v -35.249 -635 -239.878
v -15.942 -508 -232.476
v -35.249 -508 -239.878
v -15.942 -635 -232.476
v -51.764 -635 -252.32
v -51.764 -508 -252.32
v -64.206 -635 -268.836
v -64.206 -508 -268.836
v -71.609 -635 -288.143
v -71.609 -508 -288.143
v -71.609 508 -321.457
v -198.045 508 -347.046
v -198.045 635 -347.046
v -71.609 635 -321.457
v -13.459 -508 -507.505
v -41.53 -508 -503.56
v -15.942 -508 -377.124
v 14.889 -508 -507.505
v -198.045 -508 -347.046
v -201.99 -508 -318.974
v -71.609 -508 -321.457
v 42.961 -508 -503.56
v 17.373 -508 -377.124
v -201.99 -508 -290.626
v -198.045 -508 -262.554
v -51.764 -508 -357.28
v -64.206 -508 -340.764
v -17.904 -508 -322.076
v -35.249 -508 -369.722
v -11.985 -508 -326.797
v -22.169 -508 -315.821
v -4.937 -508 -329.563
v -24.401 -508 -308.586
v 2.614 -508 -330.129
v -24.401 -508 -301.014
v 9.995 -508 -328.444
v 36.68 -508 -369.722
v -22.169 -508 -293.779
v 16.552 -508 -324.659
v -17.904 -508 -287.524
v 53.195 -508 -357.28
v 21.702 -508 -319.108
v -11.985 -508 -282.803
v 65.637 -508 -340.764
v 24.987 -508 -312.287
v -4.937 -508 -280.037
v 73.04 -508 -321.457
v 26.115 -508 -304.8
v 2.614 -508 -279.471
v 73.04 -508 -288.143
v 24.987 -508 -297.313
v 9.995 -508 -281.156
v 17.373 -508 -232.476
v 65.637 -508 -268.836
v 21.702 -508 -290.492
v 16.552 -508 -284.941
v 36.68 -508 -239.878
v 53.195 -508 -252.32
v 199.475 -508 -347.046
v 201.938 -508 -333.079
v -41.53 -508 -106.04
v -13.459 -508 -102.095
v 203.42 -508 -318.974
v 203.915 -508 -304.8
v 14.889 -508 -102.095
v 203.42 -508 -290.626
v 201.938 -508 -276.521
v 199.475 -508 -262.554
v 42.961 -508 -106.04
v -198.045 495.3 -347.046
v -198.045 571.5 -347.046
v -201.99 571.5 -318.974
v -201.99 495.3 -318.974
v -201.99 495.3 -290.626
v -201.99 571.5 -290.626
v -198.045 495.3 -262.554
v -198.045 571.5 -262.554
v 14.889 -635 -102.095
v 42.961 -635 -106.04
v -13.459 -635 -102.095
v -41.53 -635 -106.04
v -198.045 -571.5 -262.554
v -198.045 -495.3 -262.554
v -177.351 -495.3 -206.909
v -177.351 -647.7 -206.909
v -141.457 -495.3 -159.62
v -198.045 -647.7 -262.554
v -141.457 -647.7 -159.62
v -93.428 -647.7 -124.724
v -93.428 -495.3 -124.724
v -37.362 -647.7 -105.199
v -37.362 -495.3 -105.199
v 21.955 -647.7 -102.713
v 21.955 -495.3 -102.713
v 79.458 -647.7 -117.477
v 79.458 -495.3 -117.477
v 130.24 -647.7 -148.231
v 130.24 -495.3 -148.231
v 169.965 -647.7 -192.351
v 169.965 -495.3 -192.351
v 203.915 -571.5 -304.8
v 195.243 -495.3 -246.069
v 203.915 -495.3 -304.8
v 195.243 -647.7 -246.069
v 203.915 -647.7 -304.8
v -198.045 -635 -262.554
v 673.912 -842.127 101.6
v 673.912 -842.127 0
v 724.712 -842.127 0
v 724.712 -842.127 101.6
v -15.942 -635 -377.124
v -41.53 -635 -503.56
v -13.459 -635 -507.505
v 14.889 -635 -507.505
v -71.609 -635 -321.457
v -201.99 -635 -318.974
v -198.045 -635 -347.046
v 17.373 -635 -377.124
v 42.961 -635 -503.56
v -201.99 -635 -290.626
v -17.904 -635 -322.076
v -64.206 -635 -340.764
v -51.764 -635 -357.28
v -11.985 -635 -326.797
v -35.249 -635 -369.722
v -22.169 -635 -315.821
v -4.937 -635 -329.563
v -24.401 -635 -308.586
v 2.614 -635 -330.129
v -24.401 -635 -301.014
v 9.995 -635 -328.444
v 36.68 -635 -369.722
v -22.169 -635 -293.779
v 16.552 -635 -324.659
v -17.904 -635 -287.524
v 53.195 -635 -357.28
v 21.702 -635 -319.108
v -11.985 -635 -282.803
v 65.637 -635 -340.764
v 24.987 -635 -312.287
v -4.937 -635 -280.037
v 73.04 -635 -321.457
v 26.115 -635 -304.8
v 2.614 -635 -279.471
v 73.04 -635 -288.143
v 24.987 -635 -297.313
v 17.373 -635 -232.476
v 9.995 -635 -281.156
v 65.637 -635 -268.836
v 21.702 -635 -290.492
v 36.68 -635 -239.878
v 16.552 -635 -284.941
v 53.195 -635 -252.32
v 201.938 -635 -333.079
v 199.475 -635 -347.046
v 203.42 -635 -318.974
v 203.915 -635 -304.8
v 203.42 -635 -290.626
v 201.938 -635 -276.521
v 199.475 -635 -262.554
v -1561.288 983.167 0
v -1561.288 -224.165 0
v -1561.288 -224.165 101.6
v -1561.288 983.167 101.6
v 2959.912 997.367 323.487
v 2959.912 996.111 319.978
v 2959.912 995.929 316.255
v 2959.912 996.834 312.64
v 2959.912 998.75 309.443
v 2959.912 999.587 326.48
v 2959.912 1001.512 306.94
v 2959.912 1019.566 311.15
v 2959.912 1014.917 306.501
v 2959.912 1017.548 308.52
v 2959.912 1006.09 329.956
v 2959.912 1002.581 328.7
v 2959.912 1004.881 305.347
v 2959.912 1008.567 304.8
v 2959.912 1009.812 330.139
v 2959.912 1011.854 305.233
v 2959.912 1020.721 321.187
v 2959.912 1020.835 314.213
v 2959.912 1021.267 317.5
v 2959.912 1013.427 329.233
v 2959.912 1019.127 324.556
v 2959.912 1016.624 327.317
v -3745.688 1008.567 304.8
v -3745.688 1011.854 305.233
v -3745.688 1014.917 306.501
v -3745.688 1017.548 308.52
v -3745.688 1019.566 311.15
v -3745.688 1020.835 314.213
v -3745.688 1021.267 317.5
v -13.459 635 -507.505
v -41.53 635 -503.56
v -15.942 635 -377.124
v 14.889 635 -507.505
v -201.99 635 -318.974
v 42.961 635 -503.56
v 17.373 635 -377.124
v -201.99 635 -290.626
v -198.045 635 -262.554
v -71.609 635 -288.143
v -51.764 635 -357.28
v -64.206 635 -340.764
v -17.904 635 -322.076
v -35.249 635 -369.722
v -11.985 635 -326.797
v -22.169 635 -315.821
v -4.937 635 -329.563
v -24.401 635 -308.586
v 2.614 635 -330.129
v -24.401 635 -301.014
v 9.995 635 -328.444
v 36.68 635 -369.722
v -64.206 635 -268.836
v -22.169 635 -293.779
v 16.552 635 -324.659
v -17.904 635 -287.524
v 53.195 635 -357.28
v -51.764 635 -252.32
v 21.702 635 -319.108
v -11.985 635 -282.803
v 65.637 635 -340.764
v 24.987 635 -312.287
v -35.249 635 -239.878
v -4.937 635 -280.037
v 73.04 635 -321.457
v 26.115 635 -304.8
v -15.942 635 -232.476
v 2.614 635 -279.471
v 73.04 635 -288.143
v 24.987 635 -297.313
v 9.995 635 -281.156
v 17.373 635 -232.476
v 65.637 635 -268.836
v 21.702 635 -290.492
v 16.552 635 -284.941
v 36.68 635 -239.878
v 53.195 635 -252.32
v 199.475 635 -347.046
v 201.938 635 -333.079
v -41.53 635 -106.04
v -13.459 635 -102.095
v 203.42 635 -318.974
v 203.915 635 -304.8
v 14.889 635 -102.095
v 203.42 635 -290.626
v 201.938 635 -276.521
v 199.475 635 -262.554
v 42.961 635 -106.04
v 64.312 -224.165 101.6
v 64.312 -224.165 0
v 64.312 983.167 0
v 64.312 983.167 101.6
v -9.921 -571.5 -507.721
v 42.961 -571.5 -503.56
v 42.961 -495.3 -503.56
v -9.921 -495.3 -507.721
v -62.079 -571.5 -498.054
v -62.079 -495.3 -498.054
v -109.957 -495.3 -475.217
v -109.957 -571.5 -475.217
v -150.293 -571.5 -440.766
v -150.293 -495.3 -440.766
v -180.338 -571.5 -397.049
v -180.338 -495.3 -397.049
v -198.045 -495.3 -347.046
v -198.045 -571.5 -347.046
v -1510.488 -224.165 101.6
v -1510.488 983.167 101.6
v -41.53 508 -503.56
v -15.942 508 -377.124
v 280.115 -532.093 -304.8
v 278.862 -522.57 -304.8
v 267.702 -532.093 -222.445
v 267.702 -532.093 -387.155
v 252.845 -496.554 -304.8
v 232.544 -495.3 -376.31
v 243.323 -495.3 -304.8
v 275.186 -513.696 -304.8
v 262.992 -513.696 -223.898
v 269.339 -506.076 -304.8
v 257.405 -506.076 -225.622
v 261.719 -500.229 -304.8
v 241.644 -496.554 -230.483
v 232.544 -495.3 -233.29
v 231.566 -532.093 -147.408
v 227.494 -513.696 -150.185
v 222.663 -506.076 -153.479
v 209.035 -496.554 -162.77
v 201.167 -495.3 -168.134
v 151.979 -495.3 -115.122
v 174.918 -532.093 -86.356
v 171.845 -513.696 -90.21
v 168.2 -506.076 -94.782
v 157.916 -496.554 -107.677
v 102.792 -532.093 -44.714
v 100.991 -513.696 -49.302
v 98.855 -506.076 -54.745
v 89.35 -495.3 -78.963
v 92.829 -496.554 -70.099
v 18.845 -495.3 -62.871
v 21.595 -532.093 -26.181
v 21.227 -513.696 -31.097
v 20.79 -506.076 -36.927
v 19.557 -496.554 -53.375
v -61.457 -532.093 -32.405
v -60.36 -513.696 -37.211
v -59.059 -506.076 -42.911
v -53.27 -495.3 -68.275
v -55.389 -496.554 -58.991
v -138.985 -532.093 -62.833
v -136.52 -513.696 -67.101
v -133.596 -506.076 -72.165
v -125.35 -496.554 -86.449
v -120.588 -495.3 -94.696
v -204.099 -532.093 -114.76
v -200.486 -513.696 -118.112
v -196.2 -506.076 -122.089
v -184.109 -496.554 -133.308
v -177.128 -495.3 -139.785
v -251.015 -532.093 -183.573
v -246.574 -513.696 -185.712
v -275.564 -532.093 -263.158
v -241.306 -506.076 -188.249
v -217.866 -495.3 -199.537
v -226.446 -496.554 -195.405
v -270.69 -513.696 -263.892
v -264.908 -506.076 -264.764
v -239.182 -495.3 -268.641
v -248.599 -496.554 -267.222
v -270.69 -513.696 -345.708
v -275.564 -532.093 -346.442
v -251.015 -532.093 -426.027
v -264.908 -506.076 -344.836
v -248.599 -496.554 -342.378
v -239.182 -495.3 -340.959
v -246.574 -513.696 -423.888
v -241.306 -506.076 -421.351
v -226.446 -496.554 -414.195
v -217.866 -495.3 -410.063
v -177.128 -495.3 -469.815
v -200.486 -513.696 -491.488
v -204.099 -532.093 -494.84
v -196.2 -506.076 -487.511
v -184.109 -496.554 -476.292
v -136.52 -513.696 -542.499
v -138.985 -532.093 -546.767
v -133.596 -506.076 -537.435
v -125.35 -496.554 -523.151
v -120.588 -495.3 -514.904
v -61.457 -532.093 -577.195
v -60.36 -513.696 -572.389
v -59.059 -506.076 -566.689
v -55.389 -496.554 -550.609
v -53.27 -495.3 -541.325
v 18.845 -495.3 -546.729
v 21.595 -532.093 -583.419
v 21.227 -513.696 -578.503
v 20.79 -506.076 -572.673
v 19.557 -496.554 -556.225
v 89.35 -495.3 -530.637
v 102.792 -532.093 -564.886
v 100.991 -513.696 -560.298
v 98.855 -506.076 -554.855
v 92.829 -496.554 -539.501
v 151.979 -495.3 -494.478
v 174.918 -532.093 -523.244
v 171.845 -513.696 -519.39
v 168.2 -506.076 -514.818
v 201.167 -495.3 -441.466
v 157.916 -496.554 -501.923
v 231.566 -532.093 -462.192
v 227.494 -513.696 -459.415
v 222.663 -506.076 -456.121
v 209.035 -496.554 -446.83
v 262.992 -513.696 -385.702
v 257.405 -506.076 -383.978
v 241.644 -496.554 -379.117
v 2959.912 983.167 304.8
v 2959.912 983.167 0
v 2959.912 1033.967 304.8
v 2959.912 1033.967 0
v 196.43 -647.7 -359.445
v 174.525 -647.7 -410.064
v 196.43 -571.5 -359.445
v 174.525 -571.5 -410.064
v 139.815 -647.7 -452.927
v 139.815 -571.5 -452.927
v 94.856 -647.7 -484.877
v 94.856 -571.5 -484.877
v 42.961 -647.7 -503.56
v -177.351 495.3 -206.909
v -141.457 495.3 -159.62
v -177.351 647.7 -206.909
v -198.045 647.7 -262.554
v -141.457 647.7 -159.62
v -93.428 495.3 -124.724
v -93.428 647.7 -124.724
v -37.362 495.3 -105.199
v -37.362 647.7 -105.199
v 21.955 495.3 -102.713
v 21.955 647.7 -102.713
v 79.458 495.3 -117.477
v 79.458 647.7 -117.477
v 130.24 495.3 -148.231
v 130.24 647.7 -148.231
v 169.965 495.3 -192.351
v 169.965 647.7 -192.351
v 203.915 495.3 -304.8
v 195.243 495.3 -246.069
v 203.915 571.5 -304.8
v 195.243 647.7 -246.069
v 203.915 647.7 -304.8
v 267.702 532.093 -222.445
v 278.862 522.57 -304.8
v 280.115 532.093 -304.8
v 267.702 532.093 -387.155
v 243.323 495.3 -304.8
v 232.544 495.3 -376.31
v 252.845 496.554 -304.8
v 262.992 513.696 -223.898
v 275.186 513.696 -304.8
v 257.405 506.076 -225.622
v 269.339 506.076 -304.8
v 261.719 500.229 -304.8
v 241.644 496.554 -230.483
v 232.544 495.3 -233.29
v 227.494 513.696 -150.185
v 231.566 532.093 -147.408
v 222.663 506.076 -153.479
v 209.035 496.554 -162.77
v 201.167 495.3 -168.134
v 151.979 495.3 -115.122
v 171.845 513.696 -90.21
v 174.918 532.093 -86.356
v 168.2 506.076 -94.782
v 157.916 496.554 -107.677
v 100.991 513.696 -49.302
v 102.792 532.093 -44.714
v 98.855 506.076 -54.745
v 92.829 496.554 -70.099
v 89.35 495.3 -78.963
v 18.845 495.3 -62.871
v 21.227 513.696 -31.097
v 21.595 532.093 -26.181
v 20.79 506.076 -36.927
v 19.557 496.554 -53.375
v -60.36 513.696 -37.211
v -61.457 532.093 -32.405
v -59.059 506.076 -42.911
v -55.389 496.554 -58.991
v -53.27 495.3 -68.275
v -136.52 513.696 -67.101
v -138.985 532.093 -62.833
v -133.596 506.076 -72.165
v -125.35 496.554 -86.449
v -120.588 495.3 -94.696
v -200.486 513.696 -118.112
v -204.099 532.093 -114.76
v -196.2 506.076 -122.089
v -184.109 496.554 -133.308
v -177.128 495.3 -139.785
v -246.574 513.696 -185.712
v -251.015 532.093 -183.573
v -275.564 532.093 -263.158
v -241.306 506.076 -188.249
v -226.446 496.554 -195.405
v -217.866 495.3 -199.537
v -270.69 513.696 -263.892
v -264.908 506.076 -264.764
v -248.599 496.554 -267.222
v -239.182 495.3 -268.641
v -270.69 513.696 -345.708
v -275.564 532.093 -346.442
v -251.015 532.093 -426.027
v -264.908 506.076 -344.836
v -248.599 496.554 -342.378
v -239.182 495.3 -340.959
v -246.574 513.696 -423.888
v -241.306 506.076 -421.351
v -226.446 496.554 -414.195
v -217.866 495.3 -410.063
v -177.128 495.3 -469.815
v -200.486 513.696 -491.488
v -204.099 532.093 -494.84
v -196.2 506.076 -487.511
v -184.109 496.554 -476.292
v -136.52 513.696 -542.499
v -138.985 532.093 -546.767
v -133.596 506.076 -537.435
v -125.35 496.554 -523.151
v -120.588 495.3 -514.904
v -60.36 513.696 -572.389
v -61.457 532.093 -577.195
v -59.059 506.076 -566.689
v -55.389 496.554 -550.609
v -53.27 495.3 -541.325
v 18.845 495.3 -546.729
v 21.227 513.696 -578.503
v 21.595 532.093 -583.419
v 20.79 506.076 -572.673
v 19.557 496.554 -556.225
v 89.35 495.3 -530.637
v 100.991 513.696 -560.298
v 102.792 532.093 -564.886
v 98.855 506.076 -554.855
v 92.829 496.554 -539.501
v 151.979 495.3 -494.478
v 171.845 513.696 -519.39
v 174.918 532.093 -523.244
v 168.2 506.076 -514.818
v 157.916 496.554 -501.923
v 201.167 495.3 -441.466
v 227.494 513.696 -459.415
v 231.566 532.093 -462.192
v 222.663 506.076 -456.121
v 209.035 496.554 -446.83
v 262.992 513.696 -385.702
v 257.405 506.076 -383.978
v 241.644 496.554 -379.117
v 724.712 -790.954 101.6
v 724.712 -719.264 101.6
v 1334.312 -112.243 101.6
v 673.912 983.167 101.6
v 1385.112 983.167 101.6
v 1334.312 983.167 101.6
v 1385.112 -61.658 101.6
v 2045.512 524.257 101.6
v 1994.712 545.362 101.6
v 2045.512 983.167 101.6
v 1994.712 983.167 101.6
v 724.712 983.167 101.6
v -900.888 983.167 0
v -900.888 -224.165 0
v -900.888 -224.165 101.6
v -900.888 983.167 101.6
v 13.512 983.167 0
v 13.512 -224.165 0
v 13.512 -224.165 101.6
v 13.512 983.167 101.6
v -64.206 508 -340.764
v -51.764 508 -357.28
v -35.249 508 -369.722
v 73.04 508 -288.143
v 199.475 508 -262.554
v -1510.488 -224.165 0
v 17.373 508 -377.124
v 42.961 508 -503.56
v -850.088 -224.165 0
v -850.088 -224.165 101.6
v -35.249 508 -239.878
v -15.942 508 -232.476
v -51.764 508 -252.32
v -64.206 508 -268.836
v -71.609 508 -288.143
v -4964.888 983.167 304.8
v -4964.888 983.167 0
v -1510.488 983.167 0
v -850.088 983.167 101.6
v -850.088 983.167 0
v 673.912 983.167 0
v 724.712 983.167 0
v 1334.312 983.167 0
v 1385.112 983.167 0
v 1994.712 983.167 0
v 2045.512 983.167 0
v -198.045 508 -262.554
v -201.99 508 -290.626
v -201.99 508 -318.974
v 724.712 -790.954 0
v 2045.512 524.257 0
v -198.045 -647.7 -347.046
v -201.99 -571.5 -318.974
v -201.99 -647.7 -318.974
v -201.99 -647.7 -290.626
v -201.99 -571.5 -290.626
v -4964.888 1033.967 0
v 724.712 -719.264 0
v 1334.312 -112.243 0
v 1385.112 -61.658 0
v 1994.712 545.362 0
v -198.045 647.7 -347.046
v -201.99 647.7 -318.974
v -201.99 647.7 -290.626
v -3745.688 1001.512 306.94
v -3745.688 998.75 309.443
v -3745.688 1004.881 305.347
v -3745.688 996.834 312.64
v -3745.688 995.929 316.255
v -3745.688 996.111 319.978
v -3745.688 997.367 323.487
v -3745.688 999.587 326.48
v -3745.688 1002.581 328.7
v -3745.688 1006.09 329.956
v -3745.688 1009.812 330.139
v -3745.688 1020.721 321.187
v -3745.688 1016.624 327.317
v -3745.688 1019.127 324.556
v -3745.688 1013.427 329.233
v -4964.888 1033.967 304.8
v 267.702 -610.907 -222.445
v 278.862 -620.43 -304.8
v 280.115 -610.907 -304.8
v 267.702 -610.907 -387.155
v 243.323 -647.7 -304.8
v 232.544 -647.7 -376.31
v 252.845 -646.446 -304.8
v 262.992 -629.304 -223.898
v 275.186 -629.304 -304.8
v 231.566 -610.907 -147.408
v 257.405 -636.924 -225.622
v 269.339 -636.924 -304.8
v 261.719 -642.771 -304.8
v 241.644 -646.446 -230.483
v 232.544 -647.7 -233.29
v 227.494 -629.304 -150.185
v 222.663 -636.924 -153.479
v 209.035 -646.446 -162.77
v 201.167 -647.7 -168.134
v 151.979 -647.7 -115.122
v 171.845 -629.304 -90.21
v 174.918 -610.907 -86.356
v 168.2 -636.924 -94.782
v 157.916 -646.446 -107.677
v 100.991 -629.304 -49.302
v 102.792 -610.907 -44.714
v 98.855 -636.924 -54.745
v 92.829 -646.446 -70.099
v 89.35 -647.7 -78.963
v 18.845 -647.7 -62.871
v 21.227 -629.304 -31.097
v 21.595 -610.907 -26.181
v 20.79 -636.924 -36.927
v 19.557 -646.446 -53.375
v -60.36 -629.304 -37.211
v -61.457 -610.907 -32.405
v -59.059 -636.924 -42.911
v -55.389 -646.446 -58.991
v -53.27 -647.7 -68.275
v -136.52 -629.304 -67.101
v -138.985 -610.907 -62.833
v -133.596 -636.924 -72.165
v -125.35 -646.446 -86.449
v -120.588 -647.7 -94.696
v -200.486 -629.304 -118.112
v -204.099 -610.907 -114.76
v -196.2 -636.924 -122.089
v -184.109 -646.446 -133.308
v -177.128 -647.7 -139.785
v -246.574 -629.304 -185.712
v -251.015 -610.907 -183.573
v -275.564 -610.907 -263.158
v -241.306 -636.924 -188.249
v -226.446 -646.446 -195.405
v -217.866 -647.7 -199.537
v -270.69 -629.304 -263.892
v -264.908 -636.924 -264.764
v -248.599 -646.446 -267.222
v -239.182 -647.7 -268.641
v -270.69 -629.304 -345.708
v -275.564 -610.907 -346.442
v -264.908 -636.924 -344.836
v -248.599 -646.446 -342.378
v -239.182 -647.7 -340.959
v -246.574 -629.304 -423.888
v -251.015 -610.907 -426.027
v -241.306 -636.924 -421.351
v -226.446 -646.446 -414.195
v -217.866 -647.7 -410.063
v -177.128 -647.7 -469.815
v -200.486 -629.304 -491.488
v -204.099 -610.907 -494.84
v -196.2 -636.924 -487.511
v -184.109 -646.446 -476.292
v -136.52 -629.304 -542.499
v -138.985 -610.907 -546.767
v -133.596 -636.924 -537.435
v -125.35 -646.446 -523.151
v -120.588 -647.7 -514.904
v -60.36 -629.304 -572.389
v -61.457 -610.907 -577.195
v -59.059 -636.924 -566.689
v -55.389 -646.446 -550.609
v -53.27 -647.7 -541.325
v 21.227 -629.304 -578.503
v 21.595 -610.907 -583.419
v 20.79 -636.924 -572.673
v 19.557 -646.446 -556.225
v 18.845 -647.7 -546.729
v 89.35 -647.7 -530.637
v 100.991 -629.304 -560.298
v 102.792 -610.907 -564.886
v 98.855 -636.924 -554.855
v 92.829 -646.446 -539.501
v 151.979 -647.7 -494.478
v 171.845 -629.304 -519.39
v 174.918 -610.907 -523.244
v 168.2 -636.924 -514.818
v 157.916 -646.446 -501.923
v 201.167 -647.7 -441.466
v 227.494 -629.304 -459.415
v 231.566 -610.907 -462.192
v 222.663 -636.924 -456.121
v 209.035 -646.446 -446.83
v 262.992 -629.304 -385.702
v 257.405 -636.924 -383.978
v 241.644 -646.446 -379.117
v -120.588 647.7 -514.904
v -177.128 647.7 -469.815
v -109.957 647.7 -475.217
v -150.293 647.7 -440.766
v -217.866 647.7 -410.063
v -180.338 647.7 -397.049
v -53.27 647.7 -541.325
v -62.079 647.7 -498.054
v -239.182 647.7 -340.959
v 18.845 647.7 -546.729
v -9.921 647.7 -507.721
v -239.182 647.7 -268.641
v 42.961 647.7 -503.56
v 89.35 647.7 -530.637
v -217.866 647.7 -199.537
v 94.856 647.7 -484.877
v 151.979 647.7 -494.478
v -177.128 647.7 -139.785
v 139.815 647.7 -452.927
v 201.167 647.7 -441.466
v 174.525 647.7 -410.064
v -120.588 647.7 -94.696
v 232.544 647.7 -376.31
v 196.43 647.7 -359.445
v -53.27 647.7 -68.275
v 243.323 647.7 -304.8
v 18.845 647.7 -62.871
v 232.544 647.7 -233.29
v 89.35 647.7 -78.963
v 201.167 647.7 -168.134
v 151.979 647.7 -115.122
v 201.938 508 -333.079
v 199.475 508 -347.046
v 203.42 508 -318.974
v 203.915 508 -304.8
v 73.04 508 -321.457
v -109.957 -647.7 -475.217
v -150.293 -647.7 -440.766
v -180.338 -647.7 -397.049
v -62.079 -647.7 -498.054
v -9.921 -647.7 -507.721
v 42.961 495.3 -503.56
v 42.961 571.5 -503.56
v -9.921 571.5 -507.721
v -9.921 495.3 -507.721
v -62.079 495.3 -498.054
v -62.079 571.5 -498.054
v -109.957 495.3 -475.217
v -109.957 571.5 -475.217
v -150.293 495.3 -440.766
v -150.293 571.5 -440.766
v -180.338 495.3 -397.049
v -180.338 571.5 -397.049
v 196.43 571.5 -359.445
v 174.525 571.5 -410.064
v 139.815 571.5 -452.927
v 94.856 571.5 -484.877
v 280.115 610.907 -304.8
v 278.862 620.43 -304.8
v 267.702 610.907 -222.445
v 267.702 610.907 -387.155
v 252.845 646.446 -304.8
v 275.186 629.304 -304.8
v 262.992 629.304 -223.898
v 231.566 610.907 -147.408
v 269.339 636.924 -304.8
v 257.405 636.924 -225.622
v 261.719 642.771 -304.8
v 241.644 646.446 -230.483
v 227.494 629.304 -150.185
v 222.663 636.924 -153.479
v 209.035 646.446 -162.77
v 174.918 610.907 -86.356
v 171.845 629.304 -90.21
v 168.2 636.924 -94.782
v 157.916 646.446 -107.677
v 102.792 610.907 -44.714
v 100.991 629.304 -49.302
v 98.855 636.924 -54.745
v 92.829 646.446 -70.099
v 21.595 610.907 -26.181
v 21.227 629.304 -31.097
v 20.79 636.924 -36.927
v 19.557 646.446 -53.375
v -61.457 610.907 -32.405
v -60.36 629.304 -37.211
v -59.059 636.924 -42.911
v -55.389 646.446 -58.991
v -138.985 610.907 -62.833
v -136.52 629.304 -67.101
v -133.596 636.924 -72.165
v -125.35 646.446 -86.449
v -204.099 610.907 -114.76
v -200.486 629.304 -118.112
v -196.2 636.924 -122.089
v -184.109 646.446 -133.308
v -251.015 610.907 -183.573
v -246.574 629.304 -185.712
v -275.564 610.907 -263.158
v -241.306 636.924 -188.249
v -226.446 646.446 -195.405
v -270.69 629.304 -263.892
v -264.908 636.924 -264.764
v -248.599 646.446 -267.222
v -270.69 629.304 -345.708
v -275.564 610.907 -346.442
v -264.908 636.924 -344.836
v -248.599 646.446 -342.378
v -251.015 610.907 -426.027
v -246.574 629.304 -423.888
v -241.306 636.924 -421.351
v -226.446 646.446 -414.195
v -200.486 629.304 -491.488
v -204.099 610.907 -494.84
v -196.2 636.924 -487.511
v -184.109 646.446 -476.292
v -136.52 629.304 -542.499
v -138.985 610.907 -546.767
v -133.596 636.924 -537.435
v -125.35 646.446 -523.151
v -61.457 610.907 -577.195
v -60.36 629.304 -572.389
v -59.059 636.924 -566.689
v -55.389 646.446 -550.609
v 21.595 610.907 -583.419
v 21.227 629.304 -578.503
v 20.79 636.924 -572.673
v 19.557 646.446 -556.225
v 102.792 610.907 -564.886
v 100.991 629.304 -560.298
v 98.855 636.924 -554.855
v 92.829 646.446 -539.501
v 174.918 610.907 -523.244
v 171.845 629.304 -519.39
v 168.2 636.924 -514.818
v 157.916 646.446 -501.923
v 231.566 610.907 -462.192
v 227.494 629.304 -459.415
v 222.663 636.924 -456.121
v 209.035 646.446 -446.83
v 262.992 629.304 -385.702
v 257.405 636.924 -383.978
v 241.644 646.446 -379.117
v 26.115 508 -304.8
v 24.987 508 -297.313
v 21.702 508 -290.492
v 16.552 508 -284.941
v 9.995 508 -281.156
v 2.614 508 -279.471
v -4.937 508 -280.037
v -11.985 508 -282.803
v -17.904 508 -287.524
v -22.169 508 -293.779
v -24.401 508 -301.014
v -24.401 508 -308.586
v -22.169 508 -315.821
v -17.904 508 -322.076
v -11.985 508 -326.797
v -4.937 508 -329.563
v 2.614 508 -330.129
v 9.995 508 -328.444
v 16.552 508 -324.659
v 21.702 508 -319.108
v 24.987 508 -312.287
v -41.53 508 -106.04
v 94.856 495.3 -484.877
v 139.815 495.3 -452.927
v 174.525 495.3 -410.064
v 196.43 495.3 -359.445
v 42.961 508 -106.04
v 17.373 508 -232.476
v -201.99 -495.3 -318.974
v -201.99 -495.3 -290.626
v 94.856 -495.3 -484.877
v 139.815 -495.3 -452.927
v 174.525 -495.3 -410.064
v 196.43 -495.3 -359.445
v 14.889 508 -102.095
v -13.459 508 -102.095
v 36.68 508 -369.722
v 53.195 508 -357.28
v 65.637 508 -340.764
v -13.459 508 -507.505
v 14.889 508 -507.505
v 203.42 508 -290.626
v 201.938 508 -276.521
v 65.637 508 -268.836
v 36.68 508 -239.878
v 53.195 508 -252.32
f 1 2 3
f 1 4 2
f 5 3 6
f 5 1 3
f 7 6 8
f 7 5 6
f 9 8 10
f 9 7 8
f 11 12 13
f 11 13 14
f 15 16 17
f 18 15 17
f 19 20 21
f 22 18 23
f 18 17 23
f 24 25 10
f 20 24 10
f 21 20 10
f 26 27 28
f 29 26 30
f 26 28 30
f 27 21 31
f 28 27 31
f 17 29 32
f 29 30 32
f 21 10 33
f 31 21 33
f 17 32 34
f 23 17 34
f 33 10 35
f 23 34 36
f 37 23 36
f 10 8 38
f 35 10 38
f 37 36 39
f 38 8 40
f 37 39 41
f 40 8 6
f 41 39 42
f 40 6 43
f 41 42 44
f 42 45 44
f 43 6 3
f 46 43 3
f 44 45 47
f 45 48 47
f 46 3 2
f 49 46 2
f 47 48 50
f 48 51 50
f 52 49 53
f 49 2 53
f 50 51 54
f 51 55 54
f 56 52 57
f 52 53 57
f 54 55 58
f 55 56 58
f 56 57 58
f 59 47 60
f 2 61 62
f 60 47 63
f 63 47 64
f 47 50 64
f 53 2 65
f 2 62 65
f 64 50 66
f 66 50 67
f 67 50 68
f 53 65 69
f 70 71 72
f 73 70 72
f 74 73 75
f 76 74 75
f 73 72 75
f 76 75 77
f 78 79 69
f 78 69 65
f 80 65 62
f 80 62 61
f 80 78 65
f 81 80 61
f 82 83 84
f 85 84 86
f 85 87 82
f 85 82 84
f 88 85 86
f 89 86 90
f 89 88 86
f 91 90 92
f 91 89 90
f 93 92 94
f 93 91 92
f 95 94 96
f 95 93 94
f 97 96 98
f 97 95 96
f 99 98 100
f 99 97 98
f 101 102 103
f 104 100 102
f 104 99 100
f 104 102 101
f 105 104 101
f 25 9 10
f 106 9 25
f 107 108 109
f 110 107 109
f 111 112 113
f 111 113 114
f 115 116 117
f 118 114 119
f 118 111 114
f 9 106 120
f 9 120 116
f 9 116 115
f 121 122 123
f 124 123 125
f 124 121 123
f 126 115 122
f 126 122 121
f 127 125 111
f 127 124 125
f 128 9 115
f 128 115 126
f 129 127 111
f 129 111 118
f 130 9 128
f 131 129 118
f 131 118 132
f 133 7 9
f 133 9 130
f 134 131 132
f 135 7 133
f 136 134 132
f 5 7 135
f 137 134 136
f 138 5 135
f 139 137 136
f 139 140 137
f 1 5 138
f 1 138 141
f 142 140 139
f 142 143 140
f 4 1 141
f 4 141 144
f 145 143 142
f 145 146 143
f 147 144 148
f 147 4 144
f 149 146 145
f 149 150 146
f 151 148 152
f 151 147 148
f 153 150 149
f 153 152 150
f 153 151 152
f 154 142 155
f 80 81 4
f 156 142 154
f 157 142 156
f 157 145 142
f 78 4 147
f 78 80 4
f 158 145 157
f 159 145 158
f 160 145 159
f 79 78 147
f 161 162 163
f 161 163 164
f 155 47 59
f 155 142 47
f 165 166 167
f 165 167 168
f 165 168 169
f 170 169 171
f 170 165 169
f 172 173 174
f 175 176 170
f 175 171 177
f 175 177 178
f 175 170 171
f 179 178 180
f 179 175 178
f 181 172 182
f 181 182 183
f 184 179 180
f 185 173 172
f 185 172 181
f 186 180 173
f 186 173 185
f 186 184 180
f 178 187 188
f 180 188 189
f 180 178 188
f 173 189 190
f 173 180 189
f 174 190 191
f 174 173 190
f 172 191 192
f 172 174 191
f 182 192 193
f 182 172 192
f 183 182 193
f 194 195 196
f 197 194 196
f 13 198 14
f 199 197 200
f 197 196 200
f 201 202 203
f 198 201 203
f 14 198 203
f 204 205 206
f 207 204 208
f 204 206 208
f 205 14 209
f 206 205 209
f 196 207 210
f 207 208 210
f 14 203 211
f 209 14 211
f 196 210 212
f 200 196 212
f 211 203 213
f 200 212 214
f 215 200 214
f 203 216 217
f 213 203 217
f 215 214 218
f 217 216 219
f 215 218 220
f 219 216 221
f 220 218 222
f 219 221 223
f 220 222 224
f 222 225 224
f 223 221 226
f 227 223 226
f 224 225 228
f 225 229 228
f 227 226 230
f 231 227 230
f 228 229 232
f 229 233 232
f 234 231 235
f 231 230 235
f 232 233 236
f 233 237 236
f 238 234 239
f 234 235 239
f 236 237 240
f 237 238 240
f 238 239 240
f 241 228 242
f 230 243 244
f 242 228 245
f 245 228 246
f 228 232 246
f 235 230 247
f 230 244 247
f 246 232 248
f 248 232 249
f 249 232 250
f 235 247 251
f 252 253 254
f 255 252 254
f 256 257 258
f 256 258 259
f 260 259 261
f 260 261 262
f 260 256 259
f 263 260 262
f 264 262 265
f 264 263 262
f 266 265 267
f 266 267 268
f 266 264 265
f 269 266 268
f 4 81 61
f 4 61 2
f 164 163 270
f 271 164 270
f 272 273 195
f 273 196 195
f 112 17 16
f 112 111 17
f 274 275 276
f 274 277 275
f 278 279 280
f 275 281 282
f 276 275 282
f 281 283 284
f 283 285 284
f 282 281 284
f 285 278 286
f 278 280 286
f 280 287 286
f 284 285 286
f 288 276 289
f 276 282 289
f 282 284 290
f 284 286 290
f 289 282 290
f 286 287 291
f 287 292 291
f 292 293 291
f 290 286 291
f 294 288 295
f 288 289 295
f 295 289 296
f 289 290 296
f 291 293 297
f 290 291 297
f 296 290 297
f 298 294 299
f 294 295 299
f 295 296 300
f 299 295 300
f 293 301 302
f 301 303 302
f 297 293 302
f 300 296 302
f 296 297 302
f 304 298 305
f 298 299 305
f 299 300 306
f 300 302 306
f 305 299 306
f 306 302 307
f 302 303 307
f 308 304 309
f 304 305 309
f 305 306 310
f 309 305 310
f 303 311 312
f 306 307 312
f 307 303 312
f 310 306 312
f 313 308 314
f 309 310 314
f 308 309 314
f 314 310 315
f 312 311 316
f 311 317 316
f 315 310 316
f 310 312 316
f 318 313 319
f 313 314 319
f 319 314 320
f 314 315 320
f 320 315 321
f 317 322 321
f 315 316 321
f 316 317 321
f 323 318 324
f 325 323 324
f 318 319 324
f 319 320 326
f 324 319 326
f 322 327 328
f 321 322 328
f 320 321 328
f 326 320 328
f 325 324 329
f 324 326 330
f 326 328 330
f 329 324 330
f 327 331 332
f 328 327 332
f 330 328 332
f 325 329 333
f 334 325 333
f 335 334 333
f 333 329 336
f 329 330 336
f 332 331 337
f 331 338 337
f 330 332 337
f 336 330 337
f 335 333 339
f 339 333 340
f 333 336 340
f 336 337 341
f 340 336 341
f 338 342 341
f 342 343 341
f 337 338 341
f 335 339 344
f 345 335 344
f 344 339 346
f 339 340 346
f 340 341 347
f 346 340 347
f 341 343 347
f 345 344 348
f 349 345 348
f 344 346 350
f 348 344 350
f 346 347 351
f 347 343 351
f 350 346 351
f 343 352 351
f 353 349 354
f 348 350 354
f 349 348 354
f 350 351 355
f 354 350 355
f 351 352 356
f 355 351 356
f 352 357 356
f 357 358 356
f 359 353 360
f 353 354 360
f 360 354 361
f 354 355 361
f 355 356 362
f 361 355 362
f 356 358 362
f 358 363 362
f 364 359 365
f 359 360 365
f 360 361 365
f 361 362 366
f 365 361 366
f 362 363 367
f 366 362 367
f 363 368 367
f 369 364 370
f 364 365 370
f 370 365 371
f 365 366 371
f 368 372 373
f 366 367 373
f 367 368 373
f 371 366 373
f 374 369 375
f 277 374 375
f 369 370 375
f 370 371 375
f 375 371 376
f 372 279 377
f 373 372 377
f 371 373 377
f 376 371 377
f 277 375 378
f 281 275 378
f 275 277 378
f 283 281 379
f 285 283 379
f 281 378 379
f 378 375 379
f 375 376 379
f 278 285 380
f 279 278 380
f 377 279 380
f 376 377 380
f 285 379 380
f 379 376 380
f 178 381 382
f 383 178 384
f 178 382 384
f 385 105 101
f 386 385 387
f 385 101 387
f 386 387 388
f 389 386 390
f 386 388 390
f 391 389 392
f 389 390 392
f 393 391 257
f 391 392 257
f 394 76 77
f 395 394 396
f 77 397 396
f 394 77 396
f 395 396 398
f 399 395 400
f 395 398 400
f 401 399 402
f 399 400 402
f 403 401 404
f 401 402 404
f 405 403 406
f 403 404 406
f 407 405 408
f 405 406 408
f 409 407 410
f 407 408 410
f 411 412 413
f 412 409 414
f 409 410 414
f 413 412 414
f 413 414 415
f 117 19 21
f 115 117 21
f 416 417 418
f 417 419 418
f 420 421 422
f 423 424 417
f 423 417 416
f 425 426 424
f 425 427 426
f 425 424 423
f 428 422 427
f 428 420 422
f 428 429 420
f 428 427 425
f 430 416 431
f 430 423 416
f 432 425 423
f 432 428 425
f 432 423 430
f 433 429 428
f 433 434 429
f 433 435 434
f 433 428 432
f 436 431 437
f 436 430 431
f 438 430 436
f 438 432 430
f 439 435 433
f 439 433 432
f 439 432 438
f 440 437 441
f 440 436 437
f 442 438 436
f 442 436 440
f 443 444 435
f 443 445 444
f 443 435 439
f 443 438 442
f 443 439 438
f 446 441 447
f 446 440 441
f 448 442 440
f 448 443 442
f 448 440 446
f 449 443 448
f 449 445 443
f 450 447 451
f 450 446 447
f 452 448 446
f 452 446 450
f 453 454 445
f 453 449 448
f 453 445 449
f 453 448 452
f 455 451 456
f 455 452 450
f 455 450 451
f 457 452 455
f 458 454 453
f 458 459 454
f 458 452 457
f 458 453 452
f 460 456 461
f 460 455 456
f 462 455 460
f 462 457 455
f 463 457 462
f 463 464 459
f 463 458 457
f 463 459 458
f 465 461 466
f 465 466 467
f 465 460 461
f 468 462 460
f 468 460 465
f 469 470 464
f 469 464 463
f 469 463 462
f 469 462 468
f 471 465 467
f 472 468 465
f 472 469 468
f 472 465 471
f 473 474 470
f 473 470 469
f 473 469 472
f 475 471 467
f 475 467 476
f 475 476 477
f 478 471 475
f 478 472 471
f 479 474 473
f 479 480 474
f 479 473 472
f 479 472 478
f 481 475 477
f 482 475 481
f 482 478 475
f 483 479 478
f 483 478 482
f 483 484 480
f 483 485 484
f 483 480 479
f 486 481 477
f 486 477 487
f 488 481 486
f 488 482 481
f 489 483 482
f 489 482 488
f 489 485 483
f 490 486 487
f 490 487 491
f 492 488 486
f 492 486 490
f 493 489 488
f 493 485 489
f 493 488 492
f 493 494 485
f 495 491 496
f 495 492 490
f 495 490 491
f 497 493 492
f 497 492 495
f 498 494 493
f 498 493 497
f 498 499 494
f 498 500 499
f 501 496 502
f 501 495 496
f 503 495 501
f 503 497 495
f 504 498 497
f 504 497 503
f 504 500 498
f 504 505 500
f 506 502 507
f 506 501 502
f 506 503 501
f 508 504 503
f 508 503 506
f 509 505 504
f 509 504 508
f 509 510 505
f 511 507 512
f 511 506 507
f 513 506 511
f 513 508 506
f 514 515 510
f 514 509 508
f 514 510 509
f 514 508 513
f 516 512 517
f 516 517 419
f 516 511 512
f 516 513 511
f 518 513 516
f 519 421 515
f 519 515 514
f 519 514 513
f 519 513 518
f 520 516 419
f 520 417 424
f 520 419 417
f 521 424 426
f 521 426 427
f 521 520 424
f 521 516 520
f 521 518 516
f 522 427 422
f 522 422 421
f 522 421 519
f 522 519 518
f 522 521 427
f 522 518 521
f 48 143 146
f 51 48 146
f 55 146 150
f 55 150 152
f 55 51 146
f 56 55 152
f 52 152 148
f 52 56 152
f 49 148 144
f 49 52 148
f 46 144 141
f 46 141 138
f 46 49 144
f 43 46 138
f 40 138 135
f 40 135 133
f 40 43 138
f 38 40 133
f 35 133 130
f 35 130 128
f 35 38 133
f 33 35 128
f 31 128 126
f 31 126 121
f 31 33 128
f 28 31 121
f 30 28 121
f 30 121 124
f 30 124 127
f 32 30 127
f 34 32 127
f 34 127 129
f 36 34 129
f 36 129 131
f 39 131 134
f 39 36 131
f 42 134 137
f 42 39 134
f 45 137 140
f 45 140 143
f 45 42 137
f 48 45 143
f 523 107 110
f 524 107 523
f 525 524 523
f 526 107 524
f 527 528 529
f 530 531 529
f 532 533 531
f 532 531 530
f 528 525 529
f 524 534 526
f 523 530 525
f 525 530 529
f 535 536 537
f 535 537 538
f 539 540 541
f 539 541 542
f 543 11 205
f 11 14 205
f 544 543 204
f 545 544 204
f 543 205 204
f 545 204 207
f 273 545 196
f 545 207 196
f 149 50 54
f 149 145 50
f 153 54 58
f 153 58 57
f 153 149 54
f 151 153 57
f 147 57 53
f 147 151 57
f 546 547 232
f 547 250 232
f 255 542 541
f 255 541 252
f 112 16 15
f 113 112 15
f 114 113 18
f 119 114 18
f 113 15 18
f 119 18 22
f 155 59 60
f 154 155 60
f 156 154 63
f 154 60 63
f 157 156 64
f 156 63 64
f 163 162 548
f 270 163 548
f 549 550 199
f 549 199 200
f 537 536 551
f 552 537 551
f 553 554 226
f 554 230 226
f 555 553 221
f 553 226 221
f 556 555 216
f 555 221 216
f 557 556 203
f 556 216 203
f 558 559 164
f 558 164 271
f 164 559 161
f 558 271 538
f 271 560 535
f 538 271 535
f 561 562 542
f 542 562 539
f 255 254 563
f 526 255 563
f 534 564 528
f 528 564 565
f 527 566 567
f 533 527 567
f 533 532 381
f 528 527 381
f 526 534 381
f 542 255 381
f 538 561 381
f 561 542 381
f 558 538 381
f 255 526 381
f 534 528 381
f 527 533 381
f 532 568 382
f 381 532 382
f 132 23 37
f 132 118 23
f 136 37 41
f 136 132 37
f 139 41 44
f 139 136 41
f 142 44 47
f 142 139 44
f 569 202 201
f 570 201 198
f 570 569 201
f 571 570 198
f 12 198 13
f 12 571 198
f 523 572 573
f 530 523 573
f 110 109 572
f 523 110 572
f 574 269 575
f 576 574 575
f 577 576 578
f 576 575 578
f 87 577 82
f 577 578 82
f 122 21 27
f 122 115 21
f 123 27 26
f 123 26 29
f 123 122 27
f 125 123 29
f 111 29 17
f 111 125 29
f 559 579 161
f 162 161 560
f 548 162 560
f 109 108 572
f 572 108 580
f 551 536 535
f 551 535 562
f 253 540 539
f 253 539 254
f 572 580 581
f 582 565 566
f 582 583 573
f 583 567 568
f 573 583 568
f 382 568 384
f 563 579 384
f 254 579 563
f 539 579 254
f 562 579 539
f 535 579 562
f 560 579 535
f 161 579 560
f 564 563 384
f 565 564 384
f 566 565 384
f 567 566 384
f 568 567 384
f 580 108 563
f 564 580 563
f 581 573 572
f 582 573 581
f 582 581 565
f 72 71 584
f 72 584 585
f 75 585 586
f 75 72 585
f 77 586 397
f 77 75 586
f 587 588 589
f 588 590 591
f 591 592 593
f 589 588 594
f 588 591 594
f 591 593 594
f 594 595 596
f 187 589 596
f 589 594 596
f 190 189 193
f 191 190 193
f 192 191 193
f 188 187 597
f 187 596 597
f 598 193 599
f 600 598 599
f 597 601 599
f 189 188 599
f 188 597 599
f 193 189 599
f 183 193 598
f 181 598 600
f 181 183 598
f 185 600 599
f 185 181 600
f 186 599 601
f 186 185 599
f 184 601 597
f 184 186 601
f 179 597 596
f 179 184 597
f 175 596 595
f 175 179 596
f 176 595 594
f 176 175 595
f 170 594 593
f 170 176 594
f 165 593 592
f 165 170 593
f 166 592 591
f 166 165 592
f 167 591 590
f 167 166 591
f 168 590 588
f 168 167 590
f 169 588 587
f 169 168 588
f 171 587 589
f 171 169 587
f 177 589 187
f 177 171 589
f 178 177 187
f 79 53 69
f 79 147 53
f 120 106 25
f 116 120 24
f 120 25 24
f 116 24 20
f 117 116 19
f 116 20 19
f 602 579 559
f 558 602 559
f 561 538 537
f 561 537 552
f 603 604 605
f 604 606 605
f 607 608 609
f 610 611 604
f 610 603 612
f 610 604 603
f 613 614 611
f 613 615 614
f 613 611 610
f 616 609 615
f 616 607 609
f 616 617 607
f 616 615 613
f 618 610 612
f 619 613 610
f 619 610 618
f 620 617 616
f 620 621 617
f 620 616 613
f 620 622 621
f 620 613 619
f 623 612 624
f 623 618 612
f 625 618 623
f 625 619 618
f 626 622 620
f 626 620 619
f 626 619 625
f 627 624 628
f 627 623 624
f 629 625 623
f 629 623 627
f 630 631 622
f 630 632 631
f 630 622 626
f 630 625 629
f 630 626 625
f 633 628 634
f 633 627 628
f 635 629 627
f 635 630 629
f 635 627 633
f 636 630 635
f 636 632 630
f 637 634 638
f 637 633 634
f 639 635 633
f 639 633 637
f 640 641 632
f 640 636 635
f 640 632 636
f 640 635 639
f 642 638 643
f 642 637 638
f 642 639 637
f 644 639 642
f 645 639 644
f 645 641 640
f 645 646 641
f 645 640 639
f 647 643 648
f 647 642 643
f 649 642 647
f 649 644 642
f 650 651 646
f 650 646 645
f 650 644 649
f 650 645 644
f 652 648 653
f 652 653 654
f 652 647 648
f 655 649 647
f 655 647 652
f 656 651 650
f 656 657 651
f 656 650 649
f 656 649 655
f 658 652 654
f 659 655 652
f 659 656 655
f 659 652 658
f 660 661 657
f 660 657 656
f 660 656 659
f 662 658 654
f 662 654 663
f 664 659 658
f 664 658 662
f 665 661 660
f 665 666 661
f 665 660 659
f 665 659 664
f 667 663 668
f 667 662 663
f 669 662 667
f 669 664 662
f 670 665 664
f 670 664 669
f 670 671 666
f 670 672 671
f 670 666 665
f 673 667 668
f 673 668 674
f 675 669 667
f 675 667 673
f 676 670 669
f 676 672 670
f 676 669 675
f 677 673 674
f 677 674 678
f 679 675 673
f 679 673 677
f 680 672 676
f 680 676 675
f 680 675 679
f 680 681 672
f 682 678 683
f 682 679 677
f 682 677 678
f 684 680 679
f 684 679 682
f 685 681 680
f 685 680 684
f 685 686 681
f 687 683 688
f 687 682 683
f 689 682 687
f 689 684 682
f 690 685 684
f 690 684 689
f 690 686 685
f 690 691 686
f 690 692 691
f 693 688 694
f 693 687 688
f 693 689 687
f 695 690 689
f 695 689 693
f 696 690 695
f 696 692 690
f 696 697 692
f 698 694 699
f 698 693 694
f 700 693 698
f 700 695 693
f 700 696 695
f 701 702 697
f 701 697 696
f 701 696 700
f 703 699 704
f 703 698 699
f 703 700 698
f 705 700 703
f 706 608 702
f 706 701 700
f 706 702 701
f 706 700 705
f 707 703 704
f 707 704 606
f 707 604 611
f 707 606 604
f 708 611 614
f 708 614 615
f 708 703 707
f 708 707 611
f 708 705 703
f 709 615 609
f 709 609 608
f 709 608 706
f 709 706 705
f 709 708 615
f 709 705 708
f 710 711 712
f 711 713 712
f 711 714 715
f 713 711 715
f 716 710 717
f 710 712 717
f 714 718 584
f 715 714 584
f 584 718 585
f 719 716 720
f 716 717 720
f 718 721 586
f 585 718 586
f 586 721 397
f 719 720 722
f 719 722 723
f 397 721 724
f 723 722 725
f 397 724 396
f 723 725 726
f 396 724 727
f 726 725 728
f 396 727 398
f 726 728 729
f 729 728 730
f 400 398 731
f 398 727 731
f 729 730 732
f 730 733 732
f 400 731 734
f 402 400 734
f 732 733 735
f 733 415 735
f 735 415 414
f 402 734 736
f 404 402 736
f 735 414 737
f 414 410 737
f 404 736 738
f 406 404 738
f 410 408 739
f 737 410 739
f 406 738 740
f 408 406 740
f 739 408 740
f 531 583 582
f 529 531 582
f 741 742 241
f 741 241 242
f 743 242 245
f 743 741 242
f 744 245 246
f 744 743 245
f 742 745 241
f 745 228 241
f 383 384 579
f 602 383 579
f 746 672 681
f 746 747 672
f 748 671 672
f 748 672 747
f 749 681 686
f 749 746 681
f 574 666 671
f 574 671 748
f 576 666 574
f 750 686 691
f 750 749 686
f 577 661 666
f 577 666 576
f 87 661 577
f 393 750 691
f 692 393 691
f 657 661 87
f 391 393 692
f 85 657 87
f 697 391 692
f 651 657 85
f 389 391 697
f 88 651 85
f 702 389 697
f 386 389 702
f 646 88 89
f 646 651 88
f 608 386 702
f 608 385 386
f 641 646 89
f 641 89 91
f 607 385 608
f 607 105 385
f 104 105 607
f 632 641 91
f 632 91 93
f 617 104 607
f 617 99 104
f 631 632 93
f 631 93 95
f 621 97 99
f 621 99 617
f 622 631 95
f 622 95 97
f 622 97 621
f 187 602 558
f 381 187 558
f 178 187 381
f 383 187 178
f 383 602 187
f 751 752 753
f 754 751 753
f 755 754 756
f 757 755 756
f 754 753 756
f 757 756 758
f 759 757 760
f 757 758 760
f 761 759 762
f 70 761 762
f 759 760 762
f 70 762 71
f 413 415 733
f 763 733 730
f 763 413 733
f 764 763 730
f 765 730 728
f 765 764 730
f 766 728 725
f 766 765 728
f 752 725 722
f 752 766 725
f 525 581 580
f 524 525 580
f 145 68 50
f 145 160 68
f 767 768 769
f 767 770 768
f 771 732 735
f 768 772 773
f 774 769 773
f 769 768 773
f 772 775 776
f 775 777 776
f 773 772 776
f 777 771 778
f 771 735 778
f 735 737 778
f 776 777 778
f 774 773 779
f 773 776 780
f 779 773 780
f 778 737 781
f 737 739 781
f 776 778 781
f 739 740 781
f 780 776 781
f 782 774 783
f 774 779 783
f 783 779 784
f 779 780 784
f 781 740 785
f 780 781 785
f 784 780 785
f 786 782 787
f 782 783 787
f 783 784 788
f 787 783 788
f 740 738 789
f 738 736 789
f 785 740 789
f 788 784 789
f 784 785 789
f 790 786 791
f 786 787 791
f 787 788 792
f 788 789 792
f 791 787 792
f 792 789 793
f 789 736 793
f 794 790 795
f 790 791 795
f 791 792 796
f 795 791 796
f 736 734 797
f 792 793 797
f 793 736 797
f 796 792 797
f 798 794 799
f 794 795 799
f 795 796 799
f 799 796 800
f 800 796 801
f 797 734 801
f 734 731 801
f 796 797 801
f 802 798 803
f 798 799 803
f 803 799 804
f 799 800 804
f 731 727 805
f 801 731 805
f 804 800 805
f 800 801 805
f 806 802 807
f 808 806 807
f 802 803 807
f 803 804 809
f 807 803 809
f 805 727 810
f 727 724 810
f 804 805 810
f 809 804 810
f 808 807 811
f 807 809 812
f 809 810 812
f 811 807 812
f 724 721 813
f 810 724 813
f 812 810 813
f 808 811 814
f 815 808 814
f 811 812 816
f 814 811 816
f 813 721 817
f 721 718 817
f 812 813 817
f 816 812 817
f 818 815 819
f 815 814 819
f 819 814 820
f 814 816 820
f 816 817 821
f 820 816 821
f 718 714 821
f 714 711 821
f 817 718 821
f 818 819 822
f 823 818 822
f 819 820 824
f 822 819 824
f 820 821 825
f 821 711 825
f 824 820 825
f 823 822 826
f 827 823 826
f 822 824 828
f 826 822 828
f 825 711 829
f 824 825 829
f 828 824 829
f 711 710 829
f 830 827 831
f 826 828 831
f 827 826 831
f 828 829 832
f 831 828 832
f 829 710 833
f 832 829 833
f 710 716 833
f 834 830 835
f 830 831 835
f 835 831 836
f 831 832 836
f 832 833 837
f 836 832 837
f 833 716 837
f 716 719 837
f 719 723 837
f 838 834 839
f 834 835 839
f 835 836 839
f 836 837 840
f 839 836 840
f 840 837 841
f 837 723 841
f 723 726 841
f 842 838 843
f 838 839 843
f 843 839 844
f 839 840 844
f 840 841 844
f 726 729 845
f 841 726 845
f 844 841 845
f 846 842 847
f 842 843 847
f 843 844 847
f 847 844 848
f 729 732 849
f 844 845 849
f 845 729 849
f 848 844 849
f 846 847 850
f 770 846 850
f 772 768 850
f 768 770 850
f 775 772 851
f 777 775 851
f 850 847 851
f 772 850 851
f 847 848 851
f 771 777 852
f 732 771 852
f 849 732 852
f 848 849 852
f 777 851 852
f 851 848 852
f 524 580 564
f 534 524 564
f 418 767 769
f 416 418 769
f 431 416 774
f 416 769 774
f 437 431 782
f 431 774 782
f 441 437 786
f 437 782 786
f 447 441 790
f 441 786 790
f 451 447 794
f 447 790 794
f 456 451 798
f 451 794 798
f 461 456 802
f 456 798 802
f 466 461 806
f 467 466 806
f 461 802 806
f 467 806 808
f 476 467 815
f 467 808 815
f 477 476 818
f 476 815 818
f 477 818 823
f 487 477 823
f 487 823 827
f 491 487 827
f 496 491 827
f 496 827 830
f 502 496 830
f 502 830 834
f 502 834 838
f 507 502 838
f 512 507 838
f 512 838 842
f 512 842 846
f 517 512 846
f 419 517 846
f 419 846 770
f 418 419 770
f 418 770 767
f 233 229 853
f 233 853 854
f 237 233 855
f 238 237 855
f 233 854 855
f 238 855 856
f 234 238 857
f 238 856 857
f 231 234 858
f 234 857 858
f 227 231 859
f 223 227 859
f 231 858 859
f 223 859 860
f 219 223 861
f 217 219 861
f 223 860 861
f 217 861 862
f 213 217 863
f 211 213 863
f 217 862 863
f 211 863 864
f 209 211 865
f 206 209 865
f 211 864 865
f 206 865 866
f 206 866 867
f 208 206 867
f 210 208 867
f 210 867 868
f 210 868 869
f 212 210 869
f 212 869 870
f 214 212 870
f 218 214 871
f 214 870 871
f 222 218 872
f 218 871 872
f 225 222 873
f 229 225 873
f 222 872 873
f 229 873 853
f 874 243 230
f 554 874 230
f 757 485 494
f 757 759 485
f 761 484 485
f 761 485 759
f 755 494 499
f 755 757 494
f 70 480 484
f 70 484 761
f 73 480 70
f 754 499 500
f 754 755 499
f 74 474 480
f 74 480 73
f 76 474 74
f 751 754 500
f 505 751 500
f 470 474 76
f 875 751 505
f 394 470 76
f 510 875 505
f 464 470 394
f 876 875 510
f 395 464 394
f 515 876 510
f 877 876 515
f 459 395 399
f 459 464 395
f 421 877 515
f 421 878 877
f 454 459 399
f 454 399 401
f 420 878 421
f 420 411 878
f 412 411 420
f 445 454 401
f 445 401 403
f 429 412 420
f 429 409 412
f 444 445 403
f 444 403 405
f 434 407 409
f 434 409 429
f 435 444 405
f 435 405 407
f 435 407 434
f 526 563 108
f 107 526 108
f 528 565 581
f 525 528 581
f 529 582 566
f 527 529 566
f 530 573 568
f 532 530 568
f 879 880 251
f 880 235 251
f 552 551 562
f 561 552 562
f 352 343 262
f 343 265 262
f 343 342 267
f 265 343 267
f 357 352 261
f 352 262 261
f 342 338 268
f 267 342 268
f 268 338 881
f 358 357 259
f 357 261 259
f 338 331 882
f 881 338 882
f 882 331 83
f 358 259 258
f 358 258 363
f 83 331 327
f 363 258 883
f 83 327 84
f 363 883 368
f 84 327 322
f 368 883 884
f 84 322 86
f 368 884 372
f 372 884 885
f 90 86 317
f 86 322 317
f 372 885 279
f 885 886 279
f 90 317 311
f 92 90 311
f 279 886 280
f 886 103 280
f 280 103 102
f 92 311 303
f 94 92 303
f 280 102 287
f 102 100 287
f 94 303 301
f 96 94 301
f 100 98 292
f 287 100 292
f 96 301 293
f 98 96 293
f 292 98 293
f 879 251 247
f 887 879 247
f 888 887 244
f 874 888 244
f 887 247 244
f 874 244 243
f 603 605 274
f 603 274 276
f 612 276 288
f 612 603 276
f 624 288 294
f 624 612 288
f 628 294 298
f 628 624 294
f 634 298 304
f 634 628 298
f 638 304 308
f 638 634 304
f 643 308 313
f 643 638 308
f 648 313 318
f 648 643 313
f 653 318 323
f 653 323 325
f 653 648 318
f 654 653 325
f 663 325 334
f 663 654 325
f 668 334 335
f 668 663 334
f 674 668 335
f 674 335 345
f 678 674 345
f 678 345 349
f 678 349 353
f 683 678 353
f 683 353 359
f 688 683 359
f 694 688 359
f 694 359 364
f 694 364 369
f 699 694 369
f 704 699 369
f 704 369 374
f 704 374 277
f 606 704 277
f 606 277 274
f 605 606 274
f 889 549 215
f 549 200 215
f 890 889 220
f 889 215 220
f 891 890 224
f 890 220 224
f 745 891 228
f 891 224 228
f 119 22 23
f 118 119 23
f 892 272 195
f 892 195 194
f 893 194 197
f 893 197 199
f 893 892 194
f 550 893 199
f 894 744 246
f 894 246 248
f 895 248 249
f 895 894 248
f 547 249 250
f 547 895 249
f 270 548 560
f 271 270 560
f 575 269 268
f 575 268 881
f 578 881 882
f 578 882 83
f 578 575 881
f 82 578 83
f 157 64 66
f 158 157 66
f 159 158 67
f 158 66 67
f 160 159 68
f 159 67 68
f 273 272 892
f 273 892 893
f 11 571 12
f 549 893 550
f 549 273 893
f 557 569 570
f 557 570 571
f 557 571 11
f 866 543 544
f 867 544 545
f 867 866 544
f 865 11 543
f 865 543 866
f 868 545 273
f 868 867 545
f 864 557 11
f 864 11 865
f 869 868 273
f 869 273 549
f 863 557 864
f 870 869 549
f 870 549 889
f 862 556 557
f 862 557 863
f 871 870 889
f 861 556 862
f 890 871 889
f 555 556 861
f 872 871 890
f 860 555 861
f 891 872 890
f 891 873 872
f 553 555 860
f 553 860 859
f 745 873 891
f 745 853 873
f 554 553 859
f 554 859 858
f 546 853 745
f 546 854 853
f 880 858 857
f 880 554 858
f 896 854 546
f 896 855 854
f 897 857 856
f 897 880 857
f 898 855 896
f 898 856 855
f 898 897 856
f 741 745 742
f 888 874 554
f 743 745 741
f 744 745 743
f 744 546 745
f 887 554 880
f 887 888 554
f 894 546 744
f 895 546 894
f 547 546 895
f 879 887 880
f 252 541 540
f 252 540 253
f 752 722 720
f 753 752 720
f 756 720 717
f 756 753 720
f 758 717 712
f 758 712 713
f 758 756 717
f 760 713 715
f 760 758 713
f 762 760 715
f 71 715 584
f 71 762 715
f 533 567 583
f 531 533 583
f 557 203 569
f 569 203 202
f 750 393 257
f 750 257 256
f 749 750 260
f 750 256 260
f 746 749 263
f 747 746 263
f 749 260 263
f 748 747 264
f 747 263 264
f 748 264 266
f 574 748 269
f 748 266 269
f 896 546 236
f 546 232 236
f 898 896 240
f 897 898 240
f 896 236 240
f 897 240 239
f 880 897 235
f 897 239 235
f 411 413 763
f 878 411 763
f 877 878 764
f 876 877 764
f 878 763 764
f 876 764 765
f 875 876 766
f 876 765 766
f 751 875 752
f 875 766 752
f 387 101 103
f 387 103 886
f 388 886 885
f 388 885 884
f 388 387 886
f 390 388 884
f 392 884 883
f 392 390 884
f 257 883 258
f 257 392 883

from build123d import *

# Parameters (mm, degrees)
F1_DEPTH = 304.8
F0_W     = 50.8
F0_H     = 1207.3322428613
F2_DEPTH = 101.6
F3_R     = 12.7
F4_DEPTH = 6705.6
F6_R     = 279.4
F7_DEPTH = 76.2
F8_R     = 36.7926146906
F6_R_2   = 25.4
F9_DEPTH = 63.5


with BuildPart() as f1:
    # F0 (on Top) → F1 (new body)
    with BuildSketch(Plane.XY):
        Polygon((2959.9124378204, 1033.9674098969), (-4964.8875621796, 1033.9674098968), (-4964.8875621796, 983.1674098968), (-4660.0875621796, 983.1674098968), (-4202.8875621796, 983.1674098968), (-3898.0875621796, 983.1674098968), (-3491.6875621796, 983.1674098968), (-1561.2875621796, 983.1674098968), (-1510.4875621796, 983.1674098968), (-900.8875621796, 983.1674098968), (-850.0875621796, 983.1674098968), (13.5124378204, 983.1674098969), (64.3124378204, 983.1674098969), (673.9124378204, 983.1674098969), (724.7124378204, 983.1674098969), (1334.3124378204, 983.1674098969), (1385.1124378204, 983.1674098969), (1468.616296829, 983.1674098969), (1544.816296829, 983.1674098969), (1994.7124378204, 983.1674098969), (2045.5124378204, 983.1674098969), (2959.9124378204, 983.1674098969), align=None)
    extrude(amount=F1_DEPTH)

    # F0 (on Top) → F2 (join)
    with BuildSketch(Plane.XY):
        Polygon((2045.5124378204, 524.2571219418), (2045.5124378204, 983.1674098969), (1994.7124378204, 983.1674098969), (1994.7124378204, 545.3622928389), (1385.1124378204, -61.6581682041), (1334.3124378204, -112.2432066244), (724.7124378204, -719.2636676675), (724.7124378204, -790.9538769849), align=None)
        Polygon((1334.3124378204, -112.2432066244), (1385.1124378204, -61.6581682041), (1385.1124378204, 983.1674098969), (1334.3124378204, 983.1674098969), align=None)
        Polygon((724.7124378204, -842.1269621186), (724.7124378204, -790.9538769849), (724.7124378204, -719.2636676675), (724.7124378204, 983.1674098969), (673.9124378204, 983.1674098969), (673.9124378204, -842.1269621186), align=None)
        with Locations((38.9124378204, 379.5012884662)):
            Rectangle(F0_W, F0_H)
        with Locations((-875.4875621796, 379.5012884662)):
            Rectangle(F0_W, F0_H)
        with Locations((-1535.8875621796, 379.5012884662)):
            Rectangle(F0_W, F0_H)
    extrude(amount=F2_DEPTH)

    # F3 (on face) → F4 (join)
    with BuildSketch(Plane.YZ.offset(2959.9124378204)):
        with Locations((1008.5674098969, 317.5)):
            Circle(F3_R)
    extrude(amount=-F4_DEPTH)


with BuildPart() as f7:
    # F6 (on offset) → F7 (new body, symmetric)
    with BuildSketch(Plane.XZ.offset(571.5)):
        with Locations((0.7153825136, -304.8)):
            Circle(F6_R)
        with BuildLine():
            ThreePointArc((199.4753600063, -262.5541558601), (202.8023284385, -283.5607371423), (203.9153825136, -304.8))
            ThreePointArc((203.9153825136, -304.8), (202.8023284385, -326.0392628577), (199.4753600063, -347.0458441399))
            ThreePointArc((199.4753600063, -347.0458441399), (144.3994804507, -448.4840979371), (42.9612266535, -503.5599774927))
            ThreePointArc((42.9612266535, -503.5599774927), (0.7153825136, -508), (-41.5304616264, -503.5599774927))
            ThreePointArc((-41.5304616264, -503.5599774927), (-142.9687154235, -448.4840979371), (-198.0445949791, -347.0458441399))
            ThreePointArc((-198.0445949791, -347.0458441399), (-202.4846174864, -304.8), (-198.0445949791, -262.5541558601))
            ThreePointArc((-198.0445949791, -262.5541558601), (-142.9687154235, -161.1159020629), (-41.5304616264, -106.0400225073))
            ThreePointArc((-41.5304616264, -106.0400225073), (0.7153825136, -101.6), (42.9612266535, -106.0400225073))
            ThreePointArc((42.9612266535, -106.0400225073), (144.3994804507, -161.1159020629), (199.4753600063, -262.5541558601))
        make_face(mode=Mode.SUBTRACT)
    extrude(amount=F7_DEPTH, both=True)

    # F8
    f8_edges = [f7.edges().sort_by_distance(p)[0] for p in [
        (-278.684617, -647.7, -304.8),
        (-278.684617, -495.3, -304.8),
    ]]
    fillet(f8_edges, radius=F8_R)


with BuildPart() as f9:
    # F6 (on offset) → F9 (new body, symmetric)
    with BuildSketch(Plane.XZ.offset(571.5)):
        with BuildLine():
            Line((17.3726308944, -232.4758021782), (42.9612266535, -106.0400225073))
            ThreePointArc((42.9612266535, -106.0400225073), (0.7153825136, -101.6), (-41.5304616264, -106.0400225073))
            Line((-41.5304616264, -106.0400225073), (-15.9418658672, -232.4758021782))
            ThreePointArc((-15.9418658672, -232.4758021782), (0.7153825136, -230.582390808), (17.3726308944, -232.4758021782))
        make_face()
        with BuildLine():
            ThreePointArc((199.4753600063, -347.0458441399), (202.8023284385, -326.0392628577), (203.9153825136, -304.8))
            ThreePointArc((203.9153825136, -304.8), (202.8023284385, -283.5607371423), (199.4753600063, -262.5541558601))
            Line((199.4753600063, -262.5541558601), (73.0395803353, -288.1427516192))
            ThreePointArc((73.0395803353, -288.1427516192), (74.4581196585, -296.4177429913), (74.9329917056, -304.8))
            ThreePointArc((74.9329917056, -304.8), (74.4581196585, -313.1822570087), (73.0395803353, -321.4572483808))
            Line((73.0395803353, -321.4572483808), (199.4753600063, -347.0458441399))
        make_face()
        with BuildLine():
            Line((-71.6088153082, -288.1427516192), (-198.0445949791, -262.5541558601))
            ThreePointArc((-198.0445949791, -262.5541558601), (-202.4846174864, -304.8), (-198.0445949791, -347.0458441399))
            Line((-198.0445949791, -347.0458441399), (-71.6088153082, -321.4572483808))
            ThreePointArc((-71.6088153082, -321.4572483808), (-73.5022266784, -304.8), (-71.6088153082, -288.1427516192))
        make_face()
        with BuildLine():
            ThreePointArc((-41.5304616264, -503.5599774927), (0.7153825136, -508), (42.9612266535, -503.5599774927))
            Line((42.9612266535, -503.5599774927), (17.3726308944, -377.1241978218))
            ThreePointArc((17.3726308944, -377.1241978218), (0.7153825136, -379.017609192), (-15.9418658672, -377.1241978218))
            Line((-15.9418658672, -377.1241978218), (-41.5304616264, -503.5599774927))
        make_face()
        with BuildLine():
            ThreePointArc((74.9329917056, -304.8), (74.4581196585, -296.4177429913), (73.0395803353, -288.1427516192))
            ThreePointArc((73.0395803353, -288.1427516192), (53.1951572567, -252.3202252569), (17.3726308944, -232.4758021782))
            ThreePointArc((17.3726308944, -232.4758021782), (0.7153825136, -230.582390808), (-15.9418658672, -232.4758021782))
            ThreePointArc((-15.9418658672, -232.4758021782), (-51.7643922295, -252.3202252569), (-71.6088153082, -288.1427516192))
            ThreePointArc((-71.6088153082, -288.1427516192), (-73.5022266784, -304.8), (-71.6088153082, -321.4572483808))
            ThreePointArc((-71.6088153082, -321.4572483808), (-51.7643922295, -357.2797747431), (-15.9418658672, -377.1241978218))
            ThreePointArc((-15.9418658672, -377.1241978218), (0.7153825136, -379.017609192), (17.3726308944, -377.1241978218))
            ThreePointArc((17.3726308944, -377.1241978218), (53.1951572567, -357.2797747431), (73.0395803353, -321.4572483808))
            ThreePointArc((73.0395803353, -321.4572483808), (74.4581196585, -313.1822570087), (74.9329917056, -304.8))
        make_face()
        with Locations((0.7153825136, -304.8)):
            Circle(F6_R_2, mode=Mode.SUBTRACT)
    extrude(amount=F9_DEPTH, both=True)


with BuildPart() as f10_1:
    # F10: instance of F9
    add(f9.part.mirror(Plane.XZ))


with BuildPart() as f10_2:
    # F10: instance of F7
    add(f7.part.mirror(Plane.XZ))


solid = Compound([f1.part, f7.part, f9.part, f10_1.part, f10_2.part])
